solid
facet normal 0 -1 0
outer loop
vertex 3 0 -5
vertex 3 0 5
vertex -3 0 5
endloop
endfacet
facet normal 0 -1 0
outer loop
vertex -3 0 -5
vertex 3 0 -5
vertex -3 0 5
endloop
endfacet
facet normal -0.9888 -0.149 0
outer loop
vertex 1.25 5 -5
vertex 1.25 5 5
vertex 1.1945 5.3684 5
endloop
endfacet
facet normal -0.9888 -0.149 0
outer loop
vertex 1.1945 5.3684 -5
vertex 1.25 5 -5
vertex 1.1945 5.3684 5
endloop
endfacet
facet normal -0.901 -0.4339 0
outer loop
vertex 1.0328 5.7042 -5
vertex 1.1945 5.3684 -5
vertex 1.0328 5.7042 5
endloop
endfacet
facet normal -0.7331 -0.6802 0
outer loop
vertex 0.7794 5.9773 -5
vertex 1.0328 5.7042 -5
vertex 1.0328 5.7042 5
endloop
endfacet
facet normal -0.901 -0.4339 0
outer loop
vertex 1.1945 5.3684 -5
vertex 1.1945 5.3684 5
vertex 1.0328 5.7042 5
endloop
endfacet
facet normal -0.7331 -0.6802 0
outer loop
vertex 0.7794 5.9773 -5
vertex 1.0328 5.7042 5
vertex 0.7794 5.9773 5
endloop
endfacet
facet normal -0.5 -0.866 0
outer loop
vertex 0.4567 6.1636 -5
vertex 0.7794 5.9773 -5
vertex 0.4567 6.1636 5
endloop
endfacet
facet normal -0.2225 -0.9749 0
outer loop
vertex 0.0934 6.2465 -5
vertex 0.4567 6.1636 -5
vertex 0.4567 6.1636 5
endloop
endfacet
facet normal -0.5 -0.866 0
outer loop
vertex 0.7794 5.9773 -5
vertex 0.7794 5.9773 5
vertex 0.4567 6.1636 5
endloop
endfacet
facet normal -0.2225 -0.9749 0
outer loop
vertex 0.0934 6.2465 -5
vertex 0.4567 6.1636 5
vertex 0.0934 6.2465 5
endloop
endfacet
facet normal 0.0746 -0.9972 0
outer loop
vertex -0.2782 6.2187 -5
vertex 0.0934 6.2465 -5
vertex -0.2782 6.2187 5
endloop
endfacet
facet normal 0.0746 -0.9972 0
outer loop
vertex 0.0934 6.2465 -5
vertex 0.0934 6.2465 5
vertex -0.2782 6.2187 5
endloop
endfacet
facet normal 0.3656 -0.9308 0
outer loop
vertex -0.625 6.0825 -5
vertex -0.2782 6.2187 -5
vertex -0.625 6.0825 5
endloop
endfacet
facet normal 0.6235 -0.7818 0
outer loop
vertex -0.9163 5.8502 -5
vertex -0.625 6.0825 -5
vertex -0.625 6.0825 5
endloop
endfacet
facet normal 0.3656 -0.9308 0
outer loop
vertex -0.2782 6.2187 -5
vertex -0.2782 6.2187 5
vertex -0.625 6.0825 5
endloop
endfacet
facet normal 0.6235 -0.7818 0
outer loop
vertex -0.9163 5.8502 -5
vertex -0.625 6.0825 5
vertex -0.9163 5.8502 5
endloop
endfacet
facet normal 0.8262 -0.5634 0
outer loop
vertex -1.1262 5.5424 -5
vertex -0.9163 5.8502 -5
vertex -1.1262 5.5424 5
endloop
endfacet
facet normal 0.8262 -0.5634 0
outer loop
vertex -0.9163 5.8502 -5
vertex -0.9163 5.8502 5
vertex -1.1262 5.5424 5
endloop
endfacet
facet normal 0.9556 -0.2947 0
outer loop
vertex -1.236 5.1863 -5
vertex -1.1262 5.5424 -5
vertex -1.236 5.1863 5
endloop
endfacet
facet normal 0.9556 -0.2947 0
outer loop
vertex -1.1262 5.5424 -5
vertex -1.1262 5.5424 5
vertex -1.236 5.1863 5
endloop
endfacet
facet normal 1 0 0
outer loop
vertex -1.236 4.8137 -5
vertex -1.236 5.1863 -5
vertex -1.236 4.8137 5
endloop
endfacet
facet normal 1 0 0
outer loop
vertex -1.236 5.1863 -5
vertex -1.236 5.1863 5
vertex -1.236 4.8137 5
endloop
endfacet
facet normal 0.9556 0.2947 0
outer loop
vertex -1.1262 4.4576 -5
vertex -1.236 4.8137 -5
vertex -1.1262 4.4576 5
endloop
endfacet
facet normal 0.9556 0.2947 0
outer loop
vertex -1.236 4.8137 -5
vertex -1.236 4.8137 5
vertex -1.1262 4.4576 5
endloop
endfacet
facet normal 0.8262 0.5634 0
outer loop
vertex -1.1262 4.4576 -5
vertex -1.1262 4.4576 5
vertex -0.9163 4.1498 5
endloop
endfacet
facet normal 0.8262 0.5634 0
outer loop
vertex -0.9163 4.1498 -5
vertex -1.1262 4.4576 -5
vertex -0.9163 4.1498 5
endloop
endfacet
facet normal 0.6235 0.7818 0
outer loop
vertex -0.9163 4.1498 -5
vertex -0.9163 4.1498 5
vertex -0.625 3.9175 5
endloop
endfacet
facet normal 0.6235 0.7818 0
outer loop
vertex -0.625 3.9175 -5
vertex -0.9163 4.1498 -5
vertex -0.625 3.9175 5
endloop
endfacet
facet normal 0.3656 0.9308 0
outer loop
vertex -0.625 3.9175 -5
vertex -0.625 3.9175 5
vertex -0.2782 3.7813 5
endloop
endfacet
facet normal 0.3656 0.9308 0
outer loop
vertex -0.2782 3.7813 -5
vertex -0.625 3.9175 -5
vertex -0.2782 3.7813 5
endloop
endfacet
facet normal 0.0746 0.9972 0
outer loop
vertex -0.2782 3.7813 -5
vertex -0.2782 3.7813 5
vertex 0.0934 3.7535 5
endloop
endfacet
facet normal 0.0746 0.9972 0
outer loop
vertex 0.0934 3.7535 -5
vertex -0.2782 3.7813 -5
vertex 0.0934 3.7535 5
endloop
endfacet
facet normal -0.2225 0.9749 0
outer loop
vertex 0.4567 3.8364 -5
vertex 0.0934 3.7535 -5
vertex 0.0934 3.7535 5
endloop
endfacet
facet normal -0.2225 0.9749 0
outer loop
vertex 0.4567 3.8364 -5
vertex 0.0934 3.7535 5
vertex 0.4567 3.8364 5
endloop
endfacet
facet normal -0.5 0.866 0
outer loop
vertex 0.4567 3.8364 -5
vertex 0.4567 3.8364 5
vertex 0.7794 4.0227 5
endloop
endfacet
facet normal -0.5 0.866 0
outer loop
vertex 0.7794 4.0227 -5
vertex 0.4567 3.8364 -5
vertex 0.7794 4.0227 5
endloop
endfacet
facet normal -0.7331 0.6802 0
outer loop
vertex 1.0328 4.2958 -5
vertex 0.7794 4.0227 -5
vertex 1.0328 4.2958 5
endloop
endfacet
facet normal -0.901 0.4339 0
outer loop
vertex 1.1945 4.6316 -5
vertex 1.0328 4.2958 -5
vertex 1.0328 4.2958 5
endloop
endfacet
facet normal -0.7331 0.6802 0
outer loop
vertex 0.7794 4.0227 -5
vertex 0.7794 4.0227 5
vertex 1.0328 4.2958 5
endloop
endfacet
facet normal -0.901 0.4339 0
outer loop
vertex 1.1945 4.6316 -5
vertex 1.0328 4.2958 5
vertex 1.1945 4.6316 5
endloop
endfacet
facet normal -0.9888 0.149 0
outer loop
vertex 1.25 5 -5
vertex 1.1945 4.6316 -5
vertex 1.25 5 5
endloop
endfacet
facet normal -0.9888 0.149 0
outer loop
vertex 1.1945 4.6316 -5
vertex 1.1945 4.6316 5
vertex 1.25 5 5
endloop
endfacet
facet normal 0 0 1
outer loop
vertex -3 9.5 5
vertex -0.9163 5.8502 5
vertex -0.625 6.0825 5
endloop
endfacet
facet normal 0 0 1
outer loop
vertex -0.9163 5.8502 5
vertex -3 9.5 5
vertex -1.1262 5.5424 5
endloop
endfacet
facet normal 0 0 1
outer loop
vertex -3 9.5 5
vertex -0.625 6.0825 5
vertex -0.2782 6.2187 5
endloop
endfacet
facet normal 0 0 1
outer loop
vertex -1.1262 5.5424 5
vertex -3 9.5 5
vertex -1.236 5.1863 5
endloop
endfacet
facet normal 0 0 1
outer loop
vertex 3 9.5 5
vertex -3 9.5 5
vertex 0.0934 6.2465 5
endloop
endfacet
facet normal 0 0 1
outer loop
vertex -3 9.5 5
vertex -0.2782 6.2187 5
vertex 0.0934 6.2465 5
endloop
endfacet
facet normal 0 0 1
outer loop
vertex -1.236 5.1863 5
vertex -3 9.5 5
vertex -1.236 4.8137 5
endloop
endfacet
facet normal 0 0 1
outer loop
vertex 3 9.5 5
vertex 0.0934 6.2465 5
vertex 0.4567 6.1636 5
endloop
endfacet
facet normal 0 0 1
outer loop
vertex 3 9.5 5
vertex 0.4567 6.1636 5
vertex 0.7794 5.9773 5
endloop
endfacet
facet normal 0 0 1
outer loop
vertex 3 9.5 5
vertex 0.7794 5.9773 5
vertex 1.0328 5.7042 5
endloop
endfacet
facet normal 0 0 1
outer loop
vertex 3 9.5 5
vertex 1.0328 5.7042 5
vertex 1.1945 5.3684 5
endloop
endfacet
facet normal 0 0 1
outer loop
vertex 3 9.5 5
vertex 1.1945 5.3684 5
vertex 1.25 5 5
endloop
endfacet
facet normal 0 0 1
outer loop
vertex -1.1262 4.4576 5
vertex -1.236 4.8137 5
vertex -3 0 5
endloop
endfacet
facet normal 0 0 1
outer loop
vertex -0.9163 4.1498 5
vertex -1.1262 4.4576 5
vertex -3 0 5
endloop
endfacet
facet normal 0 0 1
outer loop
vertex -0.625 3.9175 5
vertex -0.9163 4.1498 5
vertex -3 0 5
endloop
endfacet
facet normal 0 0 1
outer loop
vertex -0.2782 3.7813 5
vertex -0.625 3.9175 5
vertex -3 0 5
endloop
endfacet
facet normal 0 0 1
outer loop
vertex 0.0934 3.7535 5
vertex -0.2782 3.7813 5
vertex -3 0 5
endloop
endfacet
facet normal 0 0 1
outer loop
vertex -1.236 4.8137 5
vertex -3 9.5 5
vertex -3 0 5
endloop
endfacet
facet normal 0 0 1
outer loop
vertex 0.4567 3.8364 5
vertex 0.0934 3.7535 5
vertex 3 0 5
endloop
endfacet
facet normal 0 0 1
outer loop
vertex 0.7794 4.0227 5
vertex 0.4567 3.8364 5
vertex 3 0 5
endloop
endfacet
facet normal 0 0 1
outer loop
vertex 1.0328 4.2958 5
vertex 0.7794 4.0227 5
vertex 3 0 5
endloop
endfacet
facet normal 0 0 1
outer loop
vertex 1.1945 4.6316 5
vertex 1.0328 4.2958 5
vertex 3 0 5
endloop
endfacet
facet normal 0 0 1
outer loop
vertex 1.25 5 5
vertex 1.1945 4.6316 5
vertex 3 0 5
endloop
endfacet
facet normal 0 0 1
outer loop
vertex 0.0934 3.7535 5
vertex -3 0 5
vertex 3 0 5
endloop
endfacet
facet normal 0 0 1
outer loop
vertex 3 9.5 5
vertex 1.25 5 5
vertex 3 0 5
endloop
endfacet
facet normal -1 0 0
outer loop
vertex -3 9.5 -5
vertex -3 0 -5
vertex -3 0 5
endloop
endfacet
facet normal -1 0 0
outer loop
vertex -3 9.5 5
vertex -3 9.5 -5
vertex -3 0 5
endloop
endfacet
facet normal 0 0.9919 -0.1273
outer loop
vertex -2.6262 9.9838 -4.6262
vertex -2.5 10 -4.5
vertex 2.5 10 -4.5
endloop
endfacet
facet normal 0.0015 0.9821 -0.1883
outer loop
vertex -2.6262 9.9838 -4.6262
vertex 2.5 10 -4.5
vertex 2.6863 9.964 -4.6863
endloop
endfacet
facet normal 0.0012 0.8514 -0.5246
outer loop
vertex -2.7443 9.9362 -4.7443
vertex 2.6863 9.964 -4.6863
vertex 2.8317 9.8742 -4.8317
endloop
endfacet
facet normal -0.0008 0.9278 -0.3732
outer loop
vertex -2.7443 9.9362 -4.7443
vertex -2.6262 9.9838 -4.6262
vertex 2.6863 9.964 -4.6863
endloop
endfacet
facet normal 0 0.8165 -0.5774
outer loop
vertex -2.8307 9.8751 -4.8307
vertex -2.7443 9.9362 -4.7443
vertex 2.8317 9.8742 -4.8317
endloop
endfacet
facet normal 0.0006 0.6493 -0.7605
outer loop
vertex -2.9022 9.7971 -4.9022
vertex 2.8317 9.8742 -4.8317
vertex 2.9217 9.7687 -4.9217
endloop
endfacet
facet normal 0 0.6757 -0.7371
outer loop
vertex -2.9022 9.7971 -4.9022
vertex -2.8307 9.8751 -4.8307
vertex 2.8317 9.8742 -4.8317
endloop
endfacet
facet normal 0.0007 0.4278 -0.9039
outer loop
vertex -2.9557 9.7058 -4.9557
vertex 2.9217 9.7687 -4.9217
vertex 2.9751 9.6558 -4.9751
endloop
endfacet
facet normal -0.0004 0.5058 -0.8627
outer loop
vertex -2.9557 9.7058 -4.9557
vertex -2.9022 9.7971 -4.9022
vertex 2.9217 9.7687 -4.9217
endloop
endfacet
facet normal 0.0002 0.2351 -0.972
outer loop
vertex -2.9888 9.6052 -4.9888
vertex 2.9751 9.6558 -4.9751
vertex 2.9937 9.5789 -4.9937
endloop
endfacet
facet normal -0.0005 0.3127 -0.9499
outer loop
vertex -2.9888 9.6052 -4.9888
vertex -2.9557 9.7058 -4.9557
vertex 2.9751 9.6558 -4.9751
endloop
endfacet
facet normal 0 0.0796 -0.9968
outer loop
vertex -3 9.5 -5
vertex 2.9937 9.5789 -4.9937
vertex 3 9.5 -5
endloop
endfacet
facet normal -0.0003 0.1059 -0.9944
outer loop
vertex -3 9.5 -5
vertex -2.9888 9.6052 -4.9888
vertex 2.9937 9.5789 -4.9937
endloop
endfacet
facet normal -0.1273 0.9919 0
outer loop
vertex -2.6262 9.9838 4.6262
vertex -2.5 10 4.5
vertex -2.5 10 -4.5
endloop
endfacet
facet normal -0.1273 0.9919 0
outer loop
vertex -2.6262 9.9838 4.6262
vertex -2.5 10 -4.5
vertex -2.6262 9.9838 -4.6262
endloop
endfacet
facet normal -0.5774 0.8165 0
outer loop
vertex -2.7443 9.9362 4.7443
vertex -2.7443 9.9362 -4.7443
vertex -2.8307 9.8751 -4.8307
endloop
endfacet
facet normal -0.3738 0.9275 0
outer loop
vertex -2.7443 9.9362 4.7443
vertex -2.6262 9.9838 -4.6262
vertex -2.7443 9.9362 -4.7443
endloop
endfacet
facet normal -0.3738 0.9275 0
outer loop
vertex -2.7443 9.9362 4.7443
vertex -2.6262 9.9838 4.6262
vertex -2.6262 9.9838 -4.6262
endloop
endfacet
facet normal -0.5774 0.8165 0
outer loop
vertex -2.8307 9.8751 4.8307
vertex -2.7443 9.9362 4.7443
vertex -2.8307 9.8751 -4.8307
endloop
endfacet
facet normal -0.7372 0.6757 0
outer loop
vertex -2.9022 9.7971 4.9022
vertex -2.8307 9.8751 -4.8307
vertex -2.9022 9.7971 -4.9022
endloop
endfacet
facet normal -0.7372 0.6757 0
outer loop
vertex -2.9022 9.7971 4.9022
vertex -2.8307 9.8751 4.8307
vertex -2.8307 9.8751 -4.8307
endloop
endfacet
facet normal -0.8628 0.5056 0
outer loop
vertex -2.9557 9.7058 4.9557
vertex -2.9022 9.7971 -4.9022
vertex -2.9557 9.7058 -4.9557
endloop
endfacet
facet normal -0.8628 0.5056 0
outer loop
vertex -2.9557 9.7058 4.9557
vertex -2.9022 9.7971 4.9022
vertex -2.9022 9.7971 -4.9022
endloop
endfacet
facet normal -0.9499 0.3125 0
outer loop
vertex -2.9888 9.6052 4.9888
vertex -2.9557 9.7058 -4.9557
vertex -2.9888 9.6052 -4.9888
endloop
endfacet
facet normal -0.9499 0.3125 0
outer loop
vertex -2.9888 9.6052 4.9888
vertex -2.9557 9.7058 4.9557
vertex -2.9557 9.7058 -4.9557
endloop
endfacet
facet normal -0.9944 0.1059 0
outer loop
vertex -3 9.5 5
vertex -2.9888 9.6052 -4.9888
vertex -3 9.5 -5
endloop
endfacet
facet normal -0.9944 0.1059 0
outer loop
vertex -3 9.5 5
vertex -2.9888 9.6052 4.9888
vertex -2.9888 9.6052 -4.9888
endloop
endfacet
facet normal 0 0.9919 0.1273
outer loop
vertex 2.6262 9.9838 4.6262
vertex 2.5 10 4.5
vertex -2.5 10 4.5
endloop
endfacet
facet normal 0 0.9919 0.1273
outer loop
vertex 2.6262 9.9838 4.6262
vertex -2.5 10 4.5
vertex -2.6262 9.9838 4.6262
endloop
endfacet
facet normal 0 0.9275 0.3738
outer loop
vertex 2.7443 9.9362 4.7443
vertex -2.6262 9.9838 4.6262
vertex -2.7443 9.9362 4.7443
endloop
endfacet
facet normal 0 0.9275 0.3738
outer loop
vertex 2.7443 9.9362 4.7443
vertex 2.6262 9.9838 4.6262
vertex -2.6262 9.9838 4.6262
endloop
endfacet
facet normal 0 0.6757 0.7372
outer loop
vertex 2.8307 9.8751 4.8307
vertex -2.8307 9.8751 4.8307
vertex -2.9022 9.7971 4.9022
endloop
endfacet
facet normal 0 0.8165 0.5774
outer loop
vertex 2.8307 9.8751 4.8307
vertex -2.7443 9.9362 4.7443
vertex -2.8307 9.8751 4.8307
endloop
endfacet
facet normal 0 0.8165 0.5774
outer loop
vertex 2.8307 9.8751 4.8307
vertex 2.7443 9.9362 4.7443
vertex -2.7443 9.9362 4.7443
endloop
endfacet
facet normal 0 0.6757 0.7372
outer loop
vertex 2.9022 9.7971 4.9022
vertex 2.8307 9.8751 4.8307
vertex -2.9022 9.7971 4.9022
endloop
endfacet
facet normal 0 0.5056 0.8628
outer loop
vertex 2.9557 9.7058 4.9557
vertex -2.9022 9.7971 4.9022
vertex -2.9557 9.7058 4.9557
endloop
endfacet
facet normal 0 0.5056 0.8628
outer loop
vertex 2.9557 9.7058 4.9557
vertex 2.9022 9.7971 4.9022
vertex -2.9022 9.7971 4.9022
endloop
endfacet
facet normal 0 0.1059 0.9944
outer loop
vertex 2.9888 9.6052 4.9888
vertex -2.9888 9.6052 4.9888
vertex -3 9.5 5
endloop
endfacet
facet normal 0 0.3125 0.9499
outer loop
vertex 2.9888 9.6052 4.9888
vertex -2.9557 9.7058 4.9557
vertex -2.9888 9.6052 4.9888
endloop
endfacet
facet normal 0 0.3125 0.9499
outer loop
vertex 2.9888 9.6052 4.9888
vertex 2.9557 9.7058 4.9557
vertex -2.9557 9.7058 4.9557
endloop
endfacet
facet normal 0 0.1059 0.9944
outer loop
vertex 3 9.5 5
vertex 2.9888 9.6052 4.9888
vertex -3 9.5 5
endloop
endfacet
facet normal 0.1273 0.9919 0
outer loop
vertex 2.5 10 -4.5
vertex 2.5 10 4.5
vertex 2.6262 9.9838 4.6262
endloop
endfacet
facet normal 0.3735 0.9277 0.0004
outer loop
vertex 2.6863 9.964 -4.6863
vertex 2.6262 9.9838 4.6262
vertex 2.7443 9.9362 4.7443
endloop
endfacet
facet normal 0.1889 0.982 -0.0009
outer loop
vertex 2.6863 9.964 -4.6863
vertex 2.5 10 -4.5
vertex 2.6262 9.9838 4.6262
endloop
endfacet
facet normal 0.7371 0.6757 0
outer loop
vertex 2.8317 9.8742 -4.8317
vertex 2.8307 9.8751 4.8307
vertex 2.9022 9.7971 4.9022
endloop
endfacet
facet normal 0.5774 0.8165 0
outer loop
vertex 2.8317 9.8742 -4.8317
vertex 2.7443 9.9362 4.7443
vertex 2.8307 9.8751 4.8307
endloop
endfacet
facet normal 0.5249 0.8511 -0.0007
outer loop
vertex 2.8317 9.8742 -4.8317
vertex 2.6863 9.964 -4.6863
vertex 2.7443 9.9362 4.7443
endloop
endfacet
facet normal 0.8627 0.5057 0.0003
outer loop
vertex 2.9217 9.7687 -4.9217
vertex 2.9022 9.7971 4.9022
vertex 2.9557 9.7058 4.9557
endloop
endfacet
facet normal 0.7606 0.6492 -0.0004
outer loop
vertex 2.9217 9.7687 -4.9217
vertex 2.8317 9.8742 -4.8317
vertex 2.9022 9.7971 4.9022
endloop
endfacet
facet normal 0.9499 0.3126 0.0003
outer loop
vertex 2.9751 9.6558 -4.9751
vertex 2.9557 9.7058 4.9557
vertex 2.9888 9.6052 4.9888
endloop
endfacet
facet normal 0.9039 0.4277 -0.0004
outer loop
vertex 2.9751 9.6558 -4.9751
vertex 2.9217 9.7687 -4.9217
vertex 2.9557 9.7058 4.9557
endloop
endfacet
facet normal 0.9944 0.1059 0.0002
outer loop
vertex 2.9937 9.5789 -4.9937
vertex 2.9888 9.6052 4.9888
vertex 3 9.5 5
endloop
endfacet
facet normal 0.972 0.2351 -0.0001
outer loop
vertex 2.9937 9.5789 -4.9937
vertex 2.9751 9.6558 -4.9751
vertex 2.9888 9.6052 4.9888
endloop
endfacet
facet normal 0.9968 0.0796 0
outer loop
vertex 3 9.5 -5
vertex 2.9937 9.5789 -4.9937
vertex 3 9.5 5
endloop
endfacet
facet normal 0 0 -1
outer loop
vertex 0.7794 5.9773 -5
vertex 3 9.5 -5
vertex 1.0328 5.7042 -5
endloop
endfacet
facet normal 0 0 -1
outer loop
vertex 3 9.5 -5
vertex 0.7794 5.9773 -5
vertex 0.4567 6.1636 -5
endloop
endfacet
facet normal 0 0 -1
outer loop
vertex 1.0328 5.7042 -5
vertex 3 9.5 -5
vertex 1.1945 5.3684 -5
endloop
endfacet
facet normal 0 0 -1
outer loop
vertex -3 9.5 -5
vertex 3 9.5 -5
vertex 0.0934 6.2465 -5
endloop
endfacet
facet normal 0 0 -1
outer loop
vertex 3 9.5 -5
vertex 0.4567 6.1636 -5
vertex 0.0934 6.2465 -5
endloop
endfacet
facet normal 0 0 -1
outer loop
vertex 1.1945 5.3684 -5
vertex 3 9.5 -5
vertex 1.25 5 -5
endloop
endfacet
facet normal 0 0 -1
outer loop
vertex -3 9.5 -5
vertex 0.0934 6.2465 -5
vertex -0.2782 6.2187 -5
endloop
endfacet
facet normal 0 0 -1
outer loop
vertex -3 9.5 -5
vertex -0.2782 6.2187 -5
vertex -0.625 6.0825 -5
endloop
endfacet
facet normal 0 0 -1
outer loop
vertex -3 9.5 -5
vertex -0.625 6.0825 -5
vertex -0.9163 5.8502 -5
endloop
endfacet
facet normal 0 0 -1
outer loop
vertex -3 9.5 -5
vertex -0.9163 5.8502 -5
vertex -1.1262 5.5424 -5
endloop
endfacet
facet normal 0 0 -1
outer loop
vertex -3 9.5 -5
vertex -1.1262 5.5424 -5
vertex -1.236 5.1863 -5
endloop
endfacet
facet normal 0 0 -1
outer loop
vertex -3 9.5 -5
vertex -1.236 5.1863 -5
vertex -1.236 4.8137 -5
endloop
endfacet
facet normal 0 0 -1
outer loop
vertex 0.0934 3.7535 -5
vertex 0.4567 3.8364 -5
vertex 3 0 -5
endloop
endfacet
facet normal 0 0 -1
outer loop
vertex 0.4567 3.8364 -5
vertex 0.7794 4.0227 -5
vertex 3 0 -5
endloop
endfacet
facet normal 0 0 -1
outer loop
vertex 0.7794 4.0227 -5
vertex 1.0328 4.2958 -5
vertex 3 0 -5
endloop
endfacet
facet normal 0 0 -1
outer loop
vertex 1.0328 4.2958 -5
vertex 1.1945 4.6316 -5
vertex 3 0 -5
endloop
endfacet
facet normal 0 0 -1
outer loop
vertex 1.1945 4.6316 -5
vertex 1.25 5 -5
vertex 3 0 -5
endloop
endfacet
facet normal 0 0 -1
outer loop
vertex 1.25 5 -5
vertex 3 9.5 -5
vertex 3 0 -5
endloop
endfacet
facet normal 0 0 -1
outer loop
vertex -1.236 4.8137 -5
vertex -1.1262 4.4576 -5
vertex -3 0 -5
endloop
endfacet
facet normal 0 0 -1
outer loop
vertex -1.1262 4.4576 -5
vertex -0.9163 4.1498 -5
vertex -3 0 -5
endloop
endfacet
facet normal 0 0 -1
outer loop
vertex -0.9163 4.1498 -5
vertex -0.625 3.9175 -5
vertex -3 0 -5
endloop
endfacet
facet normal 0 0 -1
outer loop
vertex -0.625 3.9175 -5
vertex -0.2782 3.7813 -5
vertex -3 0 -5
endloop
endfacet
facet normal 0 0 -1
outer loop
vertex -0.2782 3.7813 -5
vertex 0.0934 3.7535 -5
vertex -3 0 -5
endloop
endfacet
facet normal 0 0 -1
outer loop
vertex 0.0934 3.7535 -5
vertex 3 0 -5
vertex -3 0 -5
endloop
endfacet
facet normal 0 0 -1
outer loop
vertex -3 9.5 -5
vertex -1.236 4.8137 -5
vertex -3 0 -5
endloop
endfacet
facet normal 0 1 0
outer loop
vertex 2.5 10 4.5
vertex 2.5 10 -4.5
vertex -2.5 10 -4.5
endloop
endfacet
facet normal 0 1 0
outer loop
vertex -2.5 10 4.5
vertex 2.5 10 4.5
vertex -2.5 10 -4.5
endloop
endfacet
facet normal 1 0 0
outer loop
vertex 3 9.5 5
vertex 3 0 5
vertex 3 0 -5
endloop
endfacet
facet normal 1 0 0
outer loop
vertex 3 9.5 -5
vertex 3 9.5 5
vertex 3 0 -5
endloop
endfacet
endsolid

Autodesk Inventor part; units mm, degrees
ref_plane "YZ Plane" through (0, 0, 0) normal (1, 0, 0) x (0, 1, 0)
ref_plane "XZ Plane" through (0, 0, 0) normal (0, 1, 0) x (-1, 0, 0)
ref_plane "XY Plane" through (0, 0, 0) normal (0, 0, 1) x (1, 0, 0)
sketch "Эскиз2" plane through (0, 0, 0) normal (0, 1, 0) x (-1, 0, 0)
  line L0 (3, 5) -> (-3, 5)
  line L1 (-3, 5) -> (-3, -5)
  line L2 (-3, -5) -> (3, -5)
  line L3 (3, -5) -> (3, 5)
  line L4 (3, 0) -> (-3, 0) construction
  line L5 (0, 5) -> (0, -5) construction
  circle A0 centre (0, 0) radius 1.25
  dimension "d0" = 6
  dimension "d1" = 10
  dimension "d2" = 2.5
extrude "Выдавливание1" add sketch "Эскиз2" along normal blind 10 contours L3 L2 L1 L0 | A0
sketch "Эскиз4" plane through (-3, 0, 5) normal (0, 0, 1) x (1, 0, 0)
  line L0 (3, 0) -> (3, 10) construction
  line L1 (6, 10) -> (0, 10) construction
  line L2 (0, 0) -> (0, 10) construction
  line L3 (0, 5) -> (6, 5) construction
  line L4 (6, 0) -> (6, 10) construction
  circle A0 centre (3, 5) radius 1.25
  dimension "d8" = 2.5
extrude "Выдавливание3" cut sketch "Эскиз4" against normal blind 10
fillet "Сопряжение1" radius 0.5 4 edges at (-3, 10, 0) (0, 10, 5) (3, 10, 0) (0, 10, -5)
properties part number "pusher"
